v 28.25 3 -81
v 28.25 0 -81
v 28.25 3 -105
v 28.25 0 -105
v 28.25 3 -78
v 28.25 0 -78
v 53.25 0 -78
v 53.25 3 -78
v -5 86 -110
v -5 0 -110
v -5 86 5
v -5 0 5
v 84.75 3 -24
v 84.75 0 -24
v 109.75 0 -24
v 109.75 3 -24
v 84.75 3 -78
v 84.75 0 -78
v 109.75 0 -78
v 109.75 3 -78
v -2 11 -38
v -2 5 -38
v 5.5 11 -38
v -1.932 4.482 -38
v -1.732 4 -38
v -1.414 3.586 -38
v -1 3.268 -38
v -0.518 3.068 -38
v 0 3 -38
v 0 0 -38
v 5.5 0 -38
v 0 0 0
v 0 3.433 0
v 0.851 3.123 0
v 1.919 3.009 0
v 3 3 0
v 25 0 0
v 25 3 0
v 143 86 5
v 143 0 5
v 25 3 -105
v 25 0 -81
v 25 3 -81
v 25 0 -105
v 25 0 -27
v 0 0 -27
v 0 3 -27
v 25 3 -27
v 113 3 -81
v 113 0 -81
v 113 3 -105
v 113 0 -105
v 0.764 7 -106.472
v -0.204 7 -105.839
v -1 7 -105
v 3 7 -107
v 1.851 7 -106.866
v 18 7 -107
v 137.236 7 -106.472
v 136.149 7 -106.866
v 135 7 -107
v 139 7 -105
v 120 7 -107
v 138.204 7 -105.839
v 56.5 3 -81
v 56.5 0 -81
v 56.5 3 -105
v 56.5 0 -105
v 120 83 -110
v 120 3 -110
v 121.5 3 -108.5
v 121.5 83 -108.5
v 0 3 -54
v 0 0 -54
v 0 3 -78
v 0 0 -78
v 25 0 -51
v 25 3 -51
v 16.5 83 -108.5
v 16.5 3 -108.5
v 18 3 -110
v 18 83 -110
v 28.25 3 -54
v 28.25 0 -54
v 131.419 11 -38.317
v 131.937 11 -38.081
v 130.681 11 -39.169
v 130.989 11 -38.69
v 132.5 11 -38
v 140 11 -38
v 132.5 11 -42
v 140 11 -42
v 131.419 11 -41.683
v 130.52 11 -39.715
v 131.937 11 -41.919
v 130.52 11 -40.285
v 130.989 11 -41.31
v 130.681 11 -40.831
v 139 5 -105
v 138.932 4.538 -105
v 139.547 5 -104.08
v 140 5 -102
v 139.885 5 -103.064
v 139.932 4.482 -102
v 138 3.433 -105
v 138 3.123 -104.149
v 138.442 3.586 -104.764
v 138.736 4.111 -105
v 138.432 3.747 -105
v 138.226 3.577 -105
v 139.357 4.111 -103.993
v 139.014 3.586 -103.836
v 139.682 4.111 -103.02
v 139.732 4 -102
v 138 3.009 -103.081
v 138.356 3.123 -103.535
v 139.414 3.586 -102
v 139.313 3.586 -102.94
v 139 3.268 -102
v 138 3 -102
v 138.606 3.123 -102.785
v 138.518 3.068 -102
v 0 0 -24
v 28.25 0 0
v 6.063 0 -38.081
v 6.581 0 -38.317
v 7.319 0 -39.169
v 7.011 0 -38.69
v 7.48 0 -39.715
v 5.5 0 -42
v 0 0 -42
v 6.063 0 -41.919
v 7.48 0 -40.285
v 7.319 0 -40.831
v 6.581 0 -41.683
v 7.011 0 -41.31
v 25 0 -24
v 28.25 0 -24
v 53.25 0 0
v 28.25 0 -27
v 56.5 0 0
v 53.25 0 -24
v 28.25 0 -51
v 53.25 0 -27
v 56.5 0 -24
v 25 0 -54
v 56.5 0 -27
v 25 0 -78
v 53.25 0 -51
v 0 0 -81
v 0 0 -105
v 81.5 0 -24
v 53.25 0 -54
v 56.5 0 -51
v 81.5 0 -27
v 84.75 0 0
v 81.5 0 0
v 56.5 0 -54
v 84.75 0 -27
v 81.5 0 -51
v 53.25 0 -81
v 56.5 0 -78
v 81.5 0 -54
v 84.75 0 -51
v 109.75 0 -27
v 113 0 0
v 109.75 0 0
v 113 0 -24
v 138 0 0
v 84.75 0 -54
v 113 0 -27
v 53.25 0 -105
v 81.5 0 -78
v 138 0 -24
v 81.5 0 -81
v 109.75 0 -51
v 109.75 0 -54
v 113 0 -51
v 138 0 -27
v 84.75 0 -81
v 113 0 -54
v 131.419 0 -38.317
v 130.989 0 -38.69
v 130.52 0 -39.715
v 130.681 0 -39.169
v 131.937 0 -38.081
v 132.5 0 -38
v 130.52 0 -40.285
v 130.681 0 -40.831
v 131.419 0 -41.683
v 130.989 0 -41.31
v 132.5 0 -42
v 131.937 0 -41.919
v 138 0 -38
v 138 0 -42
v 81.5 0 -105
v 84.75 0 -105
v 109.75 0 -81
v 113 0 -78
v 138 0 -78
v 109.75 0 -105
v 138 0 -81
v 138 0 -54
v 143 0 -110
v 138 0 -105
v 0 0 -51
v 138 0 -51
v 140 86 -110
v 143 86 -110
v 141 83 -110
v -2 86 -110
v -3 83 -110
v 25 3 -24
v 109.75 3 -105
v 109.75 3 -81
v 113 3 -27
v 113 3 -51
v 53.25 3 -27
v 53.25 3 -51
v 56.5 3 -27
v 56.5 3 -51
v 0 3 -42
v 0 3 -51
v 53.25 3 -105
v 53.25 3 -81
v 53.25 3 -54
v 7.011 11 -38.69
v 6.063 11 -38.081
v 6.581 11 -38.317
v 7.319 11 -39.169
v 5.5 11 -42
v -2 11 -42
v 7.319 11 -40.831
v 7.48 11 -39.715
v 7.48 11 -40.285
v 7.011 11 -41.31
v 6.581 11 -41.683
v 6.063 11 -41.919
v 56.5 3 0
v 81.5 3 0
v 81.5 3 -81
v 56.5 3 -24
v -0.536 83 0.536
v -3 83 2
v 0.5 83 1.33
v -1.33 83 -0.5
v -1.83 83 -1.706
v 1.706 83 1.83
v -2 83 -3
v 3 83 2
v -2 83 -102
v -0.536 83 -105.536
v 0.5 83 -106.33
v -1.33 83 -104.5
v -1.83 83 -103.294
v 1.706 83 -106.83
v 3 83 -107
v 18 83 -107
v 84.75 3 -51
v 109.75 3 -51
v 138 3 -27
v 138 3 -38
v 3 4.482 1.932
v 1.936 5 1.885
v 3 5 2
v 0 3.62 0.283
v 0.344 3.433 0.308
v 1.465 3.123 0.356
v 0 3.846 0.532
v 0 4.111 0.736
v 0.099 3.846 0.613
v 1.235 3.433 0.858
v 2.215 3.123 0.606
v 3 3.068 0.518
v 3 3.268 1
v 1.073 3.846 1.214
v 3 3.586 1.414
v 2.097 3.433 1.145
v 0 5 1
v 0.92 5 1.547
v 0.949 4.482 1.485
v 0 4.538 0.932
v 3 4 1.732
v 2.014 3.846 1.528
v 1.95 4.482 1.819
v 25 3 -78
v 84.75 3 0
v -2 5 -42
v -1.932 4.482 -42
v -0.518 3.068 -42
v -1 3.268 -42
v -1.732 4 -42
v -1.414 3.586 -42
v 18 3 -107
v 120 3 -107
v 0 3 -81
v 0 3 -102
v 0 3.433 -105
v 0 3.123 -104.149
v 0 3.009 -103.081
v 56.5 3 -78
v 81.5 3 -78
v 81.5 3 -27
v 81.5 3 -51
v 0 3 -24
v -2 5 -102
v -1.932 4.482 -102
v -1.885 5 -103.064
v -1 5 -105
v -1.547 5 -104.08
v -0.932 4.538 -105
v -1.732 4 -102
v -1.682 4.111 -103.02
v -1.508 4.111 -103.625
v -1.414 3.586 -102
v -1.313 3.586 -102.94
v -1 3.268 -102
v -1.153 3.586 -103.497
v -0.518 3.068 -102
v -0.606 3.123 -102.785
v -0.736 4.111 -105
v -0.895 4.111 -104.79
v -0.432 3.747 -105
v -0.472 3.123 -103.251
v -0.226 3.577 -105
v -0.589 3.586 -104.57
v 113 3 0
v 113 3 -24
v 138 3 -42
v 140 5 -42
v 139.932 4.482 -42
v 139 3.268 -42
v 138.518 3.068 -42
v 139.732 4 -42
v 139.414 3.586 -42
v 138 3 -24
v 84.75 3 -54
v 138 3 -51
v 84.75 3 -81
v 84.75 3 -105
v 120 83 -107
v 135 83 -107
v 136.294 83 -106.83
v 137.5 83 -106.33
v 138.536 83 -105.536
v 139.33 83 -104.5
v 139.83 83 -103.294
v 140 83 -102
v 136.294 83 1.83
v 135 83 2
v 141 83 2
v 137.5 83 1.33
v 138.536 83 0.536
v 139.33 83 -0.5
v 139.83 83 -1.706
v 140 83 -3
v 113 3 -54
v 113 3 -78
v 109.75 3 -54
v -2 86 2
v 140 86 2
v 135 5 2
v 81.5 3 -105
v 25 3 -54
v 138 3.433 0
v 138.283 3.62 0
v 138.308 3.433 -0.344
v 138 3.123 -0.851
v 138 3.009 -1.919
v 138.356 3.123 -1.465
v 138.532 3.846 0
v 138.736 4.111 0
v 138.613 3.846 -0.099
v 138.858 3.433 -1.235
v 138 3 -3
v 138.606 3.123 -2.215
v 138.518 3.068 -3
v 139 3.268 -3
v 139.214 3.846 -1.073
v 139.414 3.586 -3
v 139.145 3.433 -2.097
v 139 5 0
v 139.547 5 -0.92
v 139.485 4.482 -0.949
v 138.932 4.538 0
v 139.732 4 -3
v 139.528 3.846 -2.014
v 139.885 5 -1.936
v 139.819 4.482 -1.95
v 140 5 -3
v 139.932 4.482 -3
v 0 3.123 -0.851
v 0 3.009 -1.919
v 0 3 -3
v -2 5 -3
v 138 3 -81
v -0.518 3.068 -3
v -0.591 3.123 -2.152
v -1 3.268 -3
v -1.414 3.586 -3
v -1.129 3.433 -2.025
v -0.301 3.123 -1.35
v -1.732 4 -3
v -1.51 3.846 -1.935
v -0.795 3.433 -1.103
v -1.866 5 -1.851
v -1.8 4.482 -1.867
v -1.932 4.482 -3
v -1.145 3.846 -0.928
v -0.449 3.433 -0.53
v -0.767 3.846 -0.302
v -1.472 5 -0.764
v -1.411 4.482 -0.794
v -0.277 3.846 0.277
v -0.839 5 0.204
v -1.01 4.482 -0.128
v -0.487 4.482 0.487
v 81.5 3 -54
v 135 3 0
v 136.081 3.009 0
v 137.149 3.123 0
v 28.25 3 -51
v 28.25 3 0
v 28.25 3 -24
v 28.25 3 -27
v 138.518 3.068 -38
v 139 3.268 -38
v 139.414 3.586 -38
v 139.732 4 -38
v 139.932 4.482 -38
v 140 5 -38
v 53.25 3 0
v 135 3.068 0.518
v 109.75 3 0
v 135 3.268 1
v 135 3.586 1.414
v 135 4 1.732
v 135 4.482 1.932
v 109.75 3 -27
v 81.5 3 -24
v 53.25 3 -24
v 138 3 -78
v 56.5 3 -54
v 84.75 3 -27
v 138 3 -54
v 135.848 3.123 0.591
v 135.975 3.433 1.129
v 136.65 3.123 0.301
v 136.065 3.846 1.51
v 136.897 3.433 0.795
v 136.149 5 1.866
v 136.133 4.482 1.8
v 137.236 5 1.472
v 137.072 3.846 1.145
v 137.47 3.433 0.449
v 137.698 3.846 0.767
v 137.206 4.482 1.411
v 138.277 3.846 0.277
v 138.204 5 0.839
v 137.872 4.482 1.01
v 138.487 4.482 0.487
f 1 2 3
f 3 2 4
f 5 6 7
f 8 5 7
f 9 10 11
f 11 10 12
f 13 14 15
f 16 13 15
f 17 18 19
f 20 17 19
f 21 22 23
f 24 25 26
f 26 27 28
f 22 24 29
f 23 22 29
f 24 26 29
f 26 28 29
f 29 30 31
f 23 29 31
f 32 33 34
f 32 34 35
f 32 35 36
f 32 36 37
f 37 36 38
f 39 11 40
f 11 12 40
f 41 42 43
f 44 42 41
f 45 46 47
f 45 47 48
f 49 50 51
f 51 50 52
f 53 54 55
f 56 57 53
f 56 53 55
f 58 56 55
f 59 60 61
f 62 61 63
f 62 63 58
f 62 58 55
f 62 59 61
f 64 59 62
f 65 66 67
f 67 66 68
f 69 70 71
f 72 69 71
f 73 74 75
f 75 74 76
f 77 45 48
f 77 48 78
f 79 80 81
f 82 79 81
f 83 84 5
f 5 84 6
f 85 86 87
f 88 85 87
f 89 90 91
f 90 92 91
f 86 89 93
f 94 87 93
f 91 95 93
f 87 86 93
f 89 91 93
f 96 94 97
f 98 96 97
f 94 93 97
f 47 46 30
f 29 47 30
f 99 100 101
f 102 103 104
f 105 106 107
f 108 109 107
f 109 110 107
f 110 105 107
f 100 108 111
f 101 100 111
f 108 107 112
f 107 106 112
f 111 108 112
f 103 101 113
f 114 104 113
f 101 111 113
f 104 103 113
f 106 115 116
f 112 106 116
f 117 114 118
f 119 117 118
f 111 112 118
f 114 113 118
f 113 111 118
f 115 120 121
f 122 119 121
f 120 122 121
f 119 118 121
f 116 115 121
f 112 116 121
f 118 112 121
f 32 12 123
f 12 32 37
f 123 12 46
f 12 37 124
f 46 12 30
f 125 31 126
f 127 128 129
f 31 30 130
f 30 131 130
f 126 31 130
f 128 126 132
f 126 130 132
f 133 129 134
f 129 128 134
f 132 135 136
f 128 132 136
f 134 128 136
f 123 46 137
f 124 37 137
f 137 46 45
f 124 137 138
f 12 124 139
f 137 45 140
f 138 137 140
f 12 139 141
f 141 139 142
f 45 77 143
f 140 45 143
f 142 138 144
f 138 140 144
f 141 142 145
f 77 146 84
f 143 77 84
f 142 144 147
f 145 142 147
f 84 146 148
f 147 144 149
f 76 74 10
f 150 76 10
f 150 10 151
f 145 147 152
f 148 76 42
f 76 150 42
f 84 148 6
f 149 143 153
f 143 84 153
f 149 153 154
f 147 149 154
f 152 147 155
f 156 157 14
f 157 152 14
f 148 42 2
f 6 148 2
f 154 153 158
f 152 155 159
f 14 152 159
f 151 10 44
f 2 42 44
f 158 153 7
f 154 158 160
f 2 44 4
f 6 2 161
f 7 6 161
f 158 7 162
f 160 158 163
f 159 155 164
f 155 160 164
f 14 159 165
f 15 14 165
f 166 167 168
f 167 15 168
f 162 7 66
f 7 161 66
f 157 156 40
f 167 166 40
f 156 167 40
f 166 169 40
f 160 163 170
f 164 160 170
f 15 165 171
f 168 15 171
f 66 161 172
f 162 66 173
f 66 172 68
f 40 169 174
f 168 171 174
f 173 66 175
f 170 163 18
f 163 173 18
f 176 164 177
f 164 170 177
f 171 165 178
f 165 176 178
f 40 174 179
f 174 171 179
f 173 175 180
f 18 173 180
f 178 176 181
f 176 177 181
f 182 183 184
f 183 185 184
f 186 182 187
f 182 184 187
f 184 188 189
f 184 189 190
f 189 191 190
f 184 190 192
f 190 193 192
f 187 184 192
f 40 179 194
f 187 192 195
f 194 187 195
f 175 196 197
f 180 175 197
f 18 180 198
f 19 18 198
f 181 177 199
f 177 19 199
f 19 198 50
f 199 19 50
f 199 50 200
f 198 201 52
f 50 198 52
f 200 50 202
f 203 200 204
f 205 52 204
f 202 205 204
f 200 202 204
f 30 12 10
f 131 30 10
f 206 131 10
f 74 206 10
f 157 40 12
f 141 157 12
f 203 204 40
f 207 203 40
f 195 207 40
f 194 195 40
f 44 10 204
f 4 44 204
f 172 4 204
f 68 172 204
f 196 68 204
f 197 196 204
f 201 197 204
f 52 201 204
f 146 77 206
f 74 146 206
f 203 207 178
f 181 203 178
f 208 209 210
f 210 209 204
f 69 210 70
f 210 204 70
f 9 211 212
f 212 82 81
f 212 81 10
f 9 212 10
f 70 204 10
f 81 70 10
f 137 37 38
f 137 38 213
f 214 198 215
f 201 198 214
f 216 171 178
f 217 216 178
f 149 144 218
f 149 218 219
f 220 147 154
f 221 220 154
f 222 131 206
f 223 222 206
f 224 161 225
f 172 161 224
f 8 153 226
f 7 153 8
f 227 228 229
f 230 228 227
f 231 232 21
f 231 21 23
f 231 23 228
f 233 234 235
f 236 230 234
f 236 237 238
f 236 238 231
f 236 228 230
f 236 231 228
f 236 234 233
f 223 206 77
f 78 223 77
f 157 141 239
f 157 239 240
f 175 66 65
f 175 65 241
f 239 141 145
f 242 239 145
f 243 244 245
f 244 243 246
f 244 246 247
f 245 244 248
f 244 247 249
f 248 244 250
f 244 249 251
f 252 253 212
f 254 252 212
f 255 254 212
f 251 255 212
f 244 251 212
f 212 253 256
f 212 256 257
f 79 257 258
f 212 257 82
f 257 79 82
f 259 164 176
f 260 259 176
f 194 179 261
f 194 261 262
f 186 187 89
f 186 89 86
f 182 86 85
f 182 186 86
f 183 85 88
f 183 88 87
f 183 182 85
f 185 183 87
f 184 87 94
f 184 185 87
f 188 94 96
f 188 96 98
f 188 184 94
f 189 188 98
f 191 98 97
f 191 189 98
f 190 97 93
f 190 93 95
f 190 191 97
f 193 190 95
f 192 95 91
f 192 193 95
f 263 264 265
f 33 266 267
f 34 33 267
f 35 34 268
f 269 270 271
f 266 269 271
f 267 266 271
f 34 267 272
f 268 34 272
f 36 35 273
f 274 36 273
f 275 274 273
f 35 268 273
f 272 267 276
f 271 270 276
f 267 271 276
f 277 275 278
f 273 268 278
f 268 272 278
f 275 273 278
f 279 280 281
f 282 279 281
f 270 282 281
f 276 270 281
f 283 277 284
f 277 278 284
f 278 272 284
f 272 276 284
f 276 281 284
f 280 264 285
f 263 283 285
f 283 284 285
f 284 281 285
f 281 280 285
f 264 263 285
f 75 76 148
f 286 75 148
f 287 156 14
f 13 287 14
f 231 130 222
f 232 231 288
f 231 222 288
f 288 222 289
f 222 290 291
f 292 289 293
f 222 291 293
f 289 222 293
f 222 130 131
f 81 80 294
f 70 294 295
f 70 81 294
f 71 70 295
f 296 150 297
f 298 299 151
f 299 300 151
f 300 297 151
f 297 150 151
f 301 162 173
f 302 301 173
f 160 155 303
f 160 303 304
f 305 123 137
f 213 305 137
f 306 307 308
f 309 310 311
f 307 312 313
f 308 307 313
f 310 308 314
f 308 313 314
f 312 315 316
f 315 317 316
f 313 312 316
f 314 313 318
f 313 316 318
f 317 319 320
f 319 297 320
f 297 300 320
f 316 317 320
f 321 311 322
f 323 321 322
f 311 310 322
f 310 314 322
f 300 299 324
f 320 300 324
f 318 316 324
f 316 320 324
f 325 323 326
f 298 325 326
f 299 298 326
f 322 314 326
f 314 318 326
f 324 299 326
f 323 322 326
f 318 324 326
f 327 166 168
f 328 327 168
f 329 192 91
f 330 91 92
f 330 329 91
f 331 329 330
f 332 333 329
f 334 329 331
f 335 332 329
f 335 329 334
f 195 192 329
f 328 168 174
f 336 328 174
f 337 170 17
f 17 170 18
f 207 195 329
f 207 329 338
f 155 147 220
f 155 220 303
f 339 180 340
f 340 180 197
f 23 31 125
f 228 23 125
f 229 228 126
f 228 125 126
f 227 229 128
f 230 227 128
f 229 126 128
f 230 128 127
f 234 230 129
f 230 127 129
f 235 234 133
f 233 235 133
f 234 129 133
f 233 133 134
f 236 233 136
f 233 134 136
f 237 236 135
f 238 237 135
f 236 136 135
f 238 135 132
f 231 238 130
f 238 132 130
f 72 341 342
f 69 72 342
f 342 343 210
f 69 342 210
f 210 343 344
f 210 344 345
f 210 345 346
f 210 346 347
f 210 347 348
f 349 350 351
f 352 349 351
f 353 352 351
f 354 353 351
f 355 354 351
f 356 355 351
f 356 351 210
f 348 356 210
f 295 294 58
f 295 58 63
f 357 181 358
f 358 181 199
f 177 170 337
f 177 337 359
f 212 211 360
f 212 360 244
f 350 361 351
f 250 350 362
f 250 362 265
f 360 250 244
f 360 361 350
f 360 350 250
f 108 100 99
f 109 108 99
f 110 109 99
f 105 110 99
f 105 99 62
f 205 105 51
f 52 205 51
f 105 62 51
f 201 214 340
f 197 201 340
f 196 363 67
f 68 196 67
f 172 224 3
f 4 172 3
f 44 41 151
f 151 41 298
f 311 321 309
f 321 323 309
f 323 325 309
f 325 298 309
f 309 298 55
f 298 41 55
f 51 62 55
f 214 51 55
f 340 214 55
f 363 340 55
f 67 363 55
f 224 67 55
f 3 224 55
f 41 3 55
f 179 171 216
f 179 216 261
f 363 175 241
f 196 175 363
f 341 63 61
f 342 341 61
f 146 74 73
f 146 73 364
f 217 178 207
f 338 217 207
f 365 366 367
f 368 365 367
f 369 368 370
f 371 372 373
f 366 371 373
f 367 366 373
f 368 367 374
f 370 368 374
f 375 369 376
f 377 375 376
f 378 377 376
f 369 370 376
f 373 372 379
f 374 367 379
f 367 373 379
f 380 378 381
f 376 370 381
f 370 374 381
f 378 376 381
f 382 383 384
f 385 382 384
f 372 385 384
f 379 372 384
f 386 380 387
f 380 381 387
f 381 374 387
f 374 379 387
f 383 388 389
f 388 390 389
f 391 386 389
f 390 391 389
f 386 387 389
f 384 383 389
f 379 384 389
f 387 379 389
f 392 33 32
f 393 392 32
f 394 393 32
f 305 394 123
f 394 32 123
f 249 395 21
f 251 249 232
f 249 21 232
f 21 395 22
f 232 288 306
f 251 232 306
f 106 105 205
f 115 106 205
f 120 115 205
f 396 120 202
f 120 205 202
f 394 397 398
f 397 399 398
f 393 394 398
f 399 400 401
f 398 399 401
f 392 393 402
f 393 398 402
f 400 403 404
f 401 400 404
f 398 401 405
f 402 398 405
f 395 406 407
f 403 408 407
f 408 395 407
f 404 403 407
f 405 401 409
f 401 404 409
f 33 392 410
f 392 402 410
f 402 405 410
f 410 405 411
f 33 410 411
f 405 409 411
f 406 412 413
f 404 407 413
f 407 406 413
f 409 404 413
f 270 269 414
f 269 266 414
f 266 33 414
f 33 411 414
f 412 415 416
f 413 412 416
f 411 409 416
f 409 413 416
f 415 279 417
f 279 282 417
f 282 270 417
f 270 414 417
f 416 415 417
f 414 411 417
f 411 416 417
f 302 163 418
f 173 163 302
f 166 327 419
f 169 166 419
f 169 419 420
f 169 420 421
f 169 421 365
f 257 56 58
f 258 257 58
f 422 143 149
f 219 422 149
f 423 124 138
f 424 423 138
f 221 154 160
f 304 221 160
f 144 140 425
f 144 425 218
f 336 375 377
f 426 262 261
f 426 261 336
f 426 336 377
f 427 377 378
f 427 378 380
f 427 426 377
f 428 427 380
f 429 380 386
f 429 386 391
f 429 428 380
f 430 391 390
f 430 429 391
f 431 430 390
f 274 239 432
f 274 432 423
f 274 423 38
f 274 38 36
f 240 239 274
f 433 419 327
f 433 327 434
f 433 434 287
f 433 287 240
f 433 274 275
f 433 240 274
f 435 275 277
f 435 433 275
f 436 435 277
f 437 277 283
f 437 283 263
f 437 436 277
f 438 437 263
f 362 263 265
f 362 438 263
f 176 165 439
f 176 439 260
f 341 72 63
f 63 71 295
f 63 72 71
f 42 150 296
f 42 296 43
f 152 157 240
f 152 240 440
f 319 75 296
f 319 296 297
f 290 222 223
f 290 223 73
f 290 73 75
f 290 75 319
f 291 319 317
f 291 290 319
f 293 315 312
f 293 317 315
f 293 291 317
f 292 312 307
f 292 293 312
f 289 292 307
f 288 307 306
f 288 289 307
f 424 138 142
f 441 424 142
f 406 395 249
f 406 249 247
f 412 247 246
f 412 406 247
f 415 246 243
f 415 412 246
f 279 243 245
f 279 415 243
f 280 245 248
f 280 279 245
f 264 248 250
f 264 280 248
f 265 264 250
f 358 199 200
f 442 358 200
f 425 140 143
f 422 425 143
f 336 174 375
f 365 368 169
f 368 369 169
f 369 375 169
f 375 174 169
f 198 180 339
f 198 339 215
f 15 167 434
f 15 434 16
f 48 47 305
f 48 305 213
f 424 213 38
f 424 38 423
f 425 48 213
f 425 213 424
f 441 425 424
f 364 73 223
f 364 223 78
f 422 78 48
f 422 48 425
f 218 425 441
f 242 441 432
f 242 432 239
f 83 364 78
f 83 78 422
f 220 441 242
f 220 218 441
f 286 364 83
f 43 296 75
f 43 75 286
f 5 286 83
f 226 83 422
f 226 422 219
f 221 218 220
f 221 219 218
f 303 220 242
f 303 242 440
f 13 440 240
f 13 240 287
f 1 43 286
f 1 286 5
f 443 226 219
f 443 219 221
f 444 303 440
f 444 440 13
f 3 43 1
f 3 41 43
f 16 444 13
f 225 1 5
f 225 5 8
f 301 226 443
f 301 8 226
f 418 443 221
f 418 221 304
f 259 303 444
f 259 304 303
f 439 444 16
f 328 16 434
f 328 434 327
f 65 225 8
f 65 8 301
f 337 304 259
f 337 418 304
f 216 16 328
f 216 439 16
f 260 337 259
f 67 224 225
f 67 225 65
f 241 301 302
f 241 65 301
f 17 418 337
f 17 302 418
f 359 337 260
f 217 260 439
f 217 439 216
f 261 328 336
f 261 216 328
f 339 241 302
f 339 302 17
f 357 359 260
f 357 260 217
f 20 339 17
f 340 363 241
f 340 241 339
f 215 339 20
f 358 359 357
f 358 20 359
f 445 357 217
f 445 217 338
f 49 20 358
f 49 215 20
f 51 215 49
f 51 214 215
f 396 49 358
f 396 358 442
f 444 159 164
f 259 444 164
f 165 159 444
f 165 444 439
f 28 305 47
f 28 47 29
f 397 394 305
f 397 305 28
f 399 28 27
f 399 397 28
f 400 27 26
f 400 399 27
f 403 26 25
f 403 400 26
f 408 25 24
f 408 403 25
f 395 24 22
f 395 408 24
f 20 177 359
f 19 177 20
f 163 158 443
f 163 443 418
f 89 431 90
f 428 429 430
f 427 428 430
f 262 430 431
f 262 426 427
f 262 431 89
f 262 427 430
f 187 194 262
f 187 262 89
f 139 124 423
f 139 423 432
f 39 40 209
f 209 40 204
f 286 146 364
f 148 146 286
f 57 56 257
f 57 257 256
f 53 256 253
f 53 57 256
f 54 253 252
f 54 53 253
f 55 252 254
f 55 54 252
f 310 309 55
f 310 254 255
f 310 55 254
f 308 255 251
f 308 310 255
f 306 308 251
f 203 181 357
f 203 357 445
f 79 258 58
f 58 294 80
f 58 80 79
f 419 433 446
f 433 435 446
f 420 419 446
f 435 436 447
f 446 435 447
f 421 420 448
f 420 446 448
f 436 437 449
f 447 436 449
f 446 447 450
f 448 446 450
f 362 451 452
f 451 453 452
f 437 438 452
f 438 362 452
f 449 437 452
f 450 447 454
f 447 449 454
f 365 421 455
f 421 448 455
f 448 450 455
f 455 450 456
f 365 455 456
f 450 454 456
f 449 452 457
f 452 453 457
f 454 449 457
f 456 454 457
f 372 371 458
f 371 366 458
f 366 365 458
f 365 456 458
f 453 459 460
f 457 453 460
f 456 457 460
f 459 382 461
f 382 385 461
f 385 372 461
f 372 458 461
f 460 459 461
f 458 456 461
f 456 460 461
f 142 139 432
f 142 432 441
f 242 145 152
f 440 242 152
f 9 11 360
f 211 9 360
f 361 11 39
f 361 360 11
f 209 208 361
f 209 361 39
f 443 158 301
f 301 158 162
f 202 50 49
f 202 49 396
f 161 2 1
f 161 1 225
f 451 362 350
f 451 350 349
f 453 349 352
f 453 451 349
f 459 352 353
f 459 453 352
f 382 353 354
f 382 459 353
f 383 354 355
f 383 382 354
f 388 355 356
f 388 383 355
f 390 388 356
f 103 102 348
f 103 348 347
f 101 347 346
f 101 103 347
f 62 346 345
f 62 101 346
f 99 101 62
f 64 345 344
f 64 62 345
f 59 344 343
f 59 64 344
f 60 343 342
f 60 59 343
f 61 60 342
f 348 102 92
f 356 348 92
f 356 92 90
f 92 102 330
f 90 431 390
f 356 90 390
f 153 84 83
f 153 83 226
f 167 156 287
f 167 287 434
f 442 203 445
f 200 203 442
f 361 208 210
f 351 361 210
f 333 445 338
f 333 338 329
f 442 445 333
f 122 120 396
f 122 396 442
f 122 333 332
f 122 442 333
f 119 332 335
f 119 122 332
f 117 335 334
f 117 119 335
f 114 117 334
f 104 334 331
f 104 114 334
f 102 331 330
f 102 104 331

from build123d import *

# Parameters (mm, degrees)
SKETCH1_W                = 148
SKETCH1_H                = 115
SKETCH1_W_2              = 25
SKETCH1_H_2              = 24
BOSS_EXTRUDE2_DEPTH      = 3
BOSS_EXTRUDE3_DEPTH      = 80
SKETCH21_W               = 142
SKETCH21_H               = 2
BOSS_EXTRUDE9_DEPTH      = 4
BOSS_EXTRUDE7_DEPTH      = 8
BOSS_EXTRUDE7_DEPTH_BACK = 3
BOSS_EXTRUDE8_DEPTH      = 3
CUT_EXTRUDE1_DEPTH       = 112
FILLET1_R                = 5
FILLET2_R                = 2


with BuildPart() as part:
    # Sketch1 → Boss-Extrude2 (new body)
    with BuildSketch(Plane(origin=(0, 0, 0), x_dir=(1, 0, 0), z_dir=(0, 1, 0))):
        with Locations((69, 52.5)):
            Rectangle(SKETCH1_W, SKETCH1_H)
        with Locations((12.5, 66)):
            Rectangle(SKETCH1_W_2, SKETCH1_H_2, mode=Mode.SUBTRACT)
        with Locations((12.5, 39)):
            Rectangle(SKETCH1_W_2, SKETCH1_H_2, mode=Mode.SUBTRACT)
        with Locations((40.75, 66)):
            Rectangle(SKETCH1_W_2, SKETCH1_H_2, mode=Mode.SUBTRACT)
        with Locations((40.75, 39)):
            Rectangle(SKETCH1_W_2, SKETCH1_H_2, mode=Mode.SUBTRACT)
        with Locations((12.5, 12)):
            Rectangle(SKETCH1_W_2, SKETCH1_H_2, mode=Mode.SUBTRACT)
        with Locations((12.5, 93)):
            Rectangle(SKETCH1_W_2, SKETCH1_H_2, mode=Mode.SUBTRACT)
        with Locations((40.75, 12)):
            Rectangle(SKETCH1_W_2, SKETCH1_H_2, mode=Mode.SUBTRACT)
        with Locations((40.75, 93)):
            Rectangle(SKETCH1_W_2, SKETCH1_H_2, mode=Mode.SUBTRACT)
        with Locations((69, 66)):
            Rectangle(SKETCH1_W_2, SKETCH1_H_2, mode=Mode.SUBTRACT)
        with Locations((69, 39)):
            Rectangle(SKETCH1_W_2, SKETCH1_H_2, mode=Mode.SUBTRACT)
        with Locations((69, 12)):
            Rectangle(SKETCH1_W_2, SKETCH1_H_2, mode=Mode.SUBTRACT)
        with Locations((69, 93)):
            Rectangle(SKETCH1_W_2, SKETCH1_H_2, mode=Mode.SUBTRACT)
        with Locations((97.25, 66)):
            Rectangle(SKETCH1_W_2, SKETCH1_H_2, mode=Mode.SUBTRACT)
        with Locations((97.25, 39)):
            Rectangle(SKETCH1_W_2, SKETCH1_H_2, mode=Mode.SUBTRACT)
        with Locations((97.25, 12)):
            Rectangle(SKETCH1_W_2, SKETCH1_H_2, mode=Mode.SUBTRACT)
        with Locations((97.25, 93)):
            Rectangle(SKETCH1_W_2, SKETCH1_H_2, mode=Mode.SUBTRACT)
        with Locations((125.5, 66)):
            Rectangle(SKETCH1_W_2, SKETCH1_H_2, mode=Mode.SUBTRACT)
        with Locations((125.5, 39)):
            Rectangle(SKETCH1_W_2, SKETCH1_H_2, mode=Mode.SUBTRACT)
        with Locations((125.5, 12)):
            Rectangle(SKETCH1_W_2, SKETCH1_H_2, mode=Mode.SUBTRACT)
        with Locations((125.5, 93)):
            Rectangle(SKETCH1_W_2, SKETCH1_H_2, mode=Mode.SUBTRACT)
    extrude(amount=BOSS_EXTRUDE2_DEPTH)

    # Sketch4 → Boss-Extrude3 (add)
    with BuildSketch(Plane(origin=(0, 3, 0), x_dir=(1, 0, 0), z_dir=(0, 1, 0))):
        Polygon((-5, -5), (143, -5), (143, 110), (120, 110), (121.5, 108.5), (120, 107), (140, 107), (140, -2), (-2, -2), (-2, 107), (18, 107), (16.5, 108.5), (18, 110), (-5, 110), align=None)
    extrude(amount=BOSS_EXTRUDE3_DEPTH)

    # Sketch21 → Boss-Extrude9 (add)
    with BuildSketch(Plane(origin=(0, 3, 0), x_dir=(1, 0, 0), z_dir=(0, 1, 0))):
        with Locations((69, 106)):
            Rectangle(SKETCH21_W, SKETCH21_H)
    extrude(amount=BOSS_EXTRUDE9_DEPTH)

    # Sketch16 → Boss-Extrude7 (add, two sides: drawn at the far end of the back side and taken through both)
    with BuildSketch(Plane(origin=(0, 3, 0), x_dir=(1, 0, 0), z_dir=(0, 1, 0)).offset(-BOSS_EXTRUDE7_DEPTH_BACK)):
        with BuildLine():
            Line((5.5, 42), (-2, 42))
            Line((-2, 42), (-2, 38))
            Line((-2, 38), (5.5, 38))
            ThreePointArc((5.5, 38), (7.5, 40), (5.5, 42))
        make_face()
        with BuildLine():
            Line((140, 38), (132.5, 38))
            ThreePointArc((132.5, 38), (130.5, 40), (132.5, 42))
            Line((132.5, 42), (140, 42))
            Line((140, 42), (140, 38))
        make_face()
    extrude(amount=BOSS_EXTRUDE7_DEPTH + BOSS_EXTRUDE7_DEPTH_BACK)

    # Sketch17 → Boss-Extrude8 (add)
    with BuildSketch(Plane(origin=(0, 83, 0), x_dir=(1, 0, 0), z_dir=(0, 1, 0))):
        Polygon((-2, 110), (-5, 110), (-5, -5), (143, -5), (143, 110), (140, 110), (140, -2), (-2, -2), align=None)
    extrude(amount=BOSS_EXTRUDE8_DEPTH)

    # Sketch18 → Cut-Extrude1 (cut)
    with BuildSketch(Plane(origin=(0, 0, -110), x_dir=(-1, 0, 0), z_dir=(0, 0, -1))):
        Polygon((2, 86), (3, 83), (2, 83), align=None)
        Polygon((-140, 83), (-140, 86), (-141, 83), align=None)
    extrude(amount=-CUT_EXTRUDE1_DEPTH, mode=Mode.SUBTRACT)

    # Fillet1
    # the kernel refuses this fillet: 5 mm, written as the material it adds along each edge
    with BuildSketch(Plane(origin=(140, -5.5, -107), x_dir=(-1, 0, 0), z_dir=(0, 1, 0))) as fillet1_piece_1_section:
        with BuildLine():
            CenterArc((FILLET1_R, FILLET1_R), FILLET1_R, 180, 90)
            Line((0, FILLET1_R), (0, 0))
            Line((0, 0), (FILLET1_R, 0))
        make_face()
    fillet1_piece_1 = extrude(amount=88.5, mode=Mode.PRIVATE)
    fillet1_piece_1 = split(fillet1_piece_1, bisect_by=Plane(origin=(139.705950561, 3, -104.265828048), z_dir=(0, 1, 0)), keep=Keep.TOP, mode=Mode.PRIVATE)
    add(fillet1_piece_1)
    with BuildSketch(Plane(origin=(-2, -5.5, -107), x_dir=(0, 0, 1), z_dir=(0, 1, 0))) as fillet1_piece_2_section:
        with BuildLine():
            CenterArc((FILLET1_R, FILLET1_R), FILLET1_R, 180, 90)
            Line((0, FILLET1_R), (0, 0))
            Line((0, 0), (FILLET1_R, 0))
        make_face()
    fillet1_piece_2 = extrude(amount=88.5, mode=Mode.PRIVATE)
    fillet1_piece_2 = split(fillet1_piece_2, bisect_by=Plane(origin=(-1.705950561, 3, -104.265828048), z_dir=(0, 1, 0)), keep=Keep.TOP, mode=Mode.PRIVATE)
    add(fillet1_piece_2)
    with BuildSketch(Plane(origin=(140, 3, 2), x_dir=(-1, 0, 0), z_dir=(0, 1, 0)), Plane(origin=(-2, 3, 2), x_dir=(0, 0, -1), z_dir=(0, 1, 0))) as fillet1_piece_3:
        with BuildLine():
            CenterArc((FILLET1_R, -FILLET1_R), FILLET1_R, 90, 90)
            Line((0, -FILLET1_R), (0, 0))
            Line((0, 0), (FILLET1_R, 0))
        make_face()
    extrude(amount=80)

    # Fillet2
    # the kernel refuses this fillet: 2 mm, written as the material it adds along each edge
    with BuildSketch(Plane(origin=(135, 3, -102), x_dir=(-0.07270796920191176, 0, -0.9973532730254281), z_dir=(-0.9973532730254281, 0, 0.07270796920191176))) as fillet2_piece_1_section:
        with BuildLine():
            CenterArc((5 - FILLET2_R, -FILLET2_R), FILLET2_R, 0, 90)
            Line((5 - FILLET2_R, 0), (5, 0))
            Line((5, 0), (5, -FILLET2_R))
        make_face()
    fillet2_piece_1 = revolve(axis=Axis((135, 3, -102), (0, -1, 0)), revolution_arc=94.169538965, mode=Mode.PRIVATE)
    fillet2_piece_1 = split(fillet2_piece_1, bisect_by=Plane(origin=(138, 3.470530123, -106.266382325), z_dir=(-1, 0, 0)), keep=Keep.TOP, mode=Mode.PRIVATE)
    fillet2_piece_1 = split(fillet2_piece_1, bisect_by=Plane(origin=(136.35715758, 3.470530123, -105), z_dir=(0, 0, -1)), keep=Keep.TOP, mode=Mode.PRIVATE)
    add(fillet2_piece_1)
    with BuildSketch(Plane(origin=(135, 3, -102), x_dir=(-0.07270796920191176, 0, -0.9973532730254281), z_dir=(-0.9973532730254281, 0, 0.07270796920191176))) as fillet2_piece_2_section:
        with BuildLine():
            CenterArc((5 - FILLET2_R, -FILLET2_R), FILLET2_R, 0, 90)
            Line((5 - FILLET2_R, 0), (5, 0))
            Line((5, 0), (5, -FILLET2_R))
        make_face()
    fillet2_piece_2 = revolve(axis=Axis((135, 3, -102), (0, -1, 0)), revolution_arc=94.169538965, mode=Mode.PRIVATE)
    fillet2_piece_2 = split(fillet2_piece_2, bisect_by=Plane(origin=(138, 3.649157182, -105.409619708), z_dir=(1, 0, 0)), keep=Keep.TOP, mode=Mode.PRIVATE)
    fillet2_piece_2 = split(fillet2_piece_2, bisect_by=Plane(origin=(138.409619683, 3.649157182, -105), z_dir=(0, 0, -1)), keep=Keep.TOP, mode=Mode.PRIVATE)
    add(fillet2_piece_2)
    with BuildSketch(Plane(origin=(135, 3, -102), x_dir=(-0.07270796920191176, 0, -0.9973532730254281), z_dir=(-0.9973532730254281, 0, 0.07270796920191176))) as fillet2_piece_3_section:
        with BuildLine():
            CenterArc((5 - FILLET2_R, -FILLET2_R), FILLET2_R, 0, 90)
            Line((5 - FILLET2_R, 0), (5, 0))
            Line((5, 0), (5, -FILLET2_R))
        make_face()
    fillet2_piece_3 = revolve(axis=Axis((135, 3, -102), (0, -1, 0)), revolution_arc=94.169538965, mode=Mode.PRIVATE)
    fillet2_piece_3 = split(fillet2_piece_3, bisect_by=Plane(origin=(138, 3.469844762, -103.519186596), z_dir=(1, 0, 0)), keep=Keep.TOP, mode=Mode.PRIVATE)
    fillet2_piece_3 = split(fillet2_piece_3, bisect_by=Plane(origin=(139.232598195, 3.469844762, -105), z_dir=(0, 0, 1)), keep=Keep.TOP, mode=Mode.PRIVATE)
    add(fillet2_piece_3)
    with BuildSketch(Plane(origin=(135, 3, -3), x_dir=(0, 0, 1), z_dir=(-1, 0, 0))) as fillet2_piece_4_section:
        with BuildLine():
            CenterArc((5 - FILLET2_R, FILLET2_R), FILLET2_R, 270, 90)
            Line((5 - FILLET2_R, 0), (5, 0))
            Line((5, 0), (5, FILLET2_R))
        make_face()
    fillet2_piece_4 = revolve(axis=Axis((135, 3, -3), (0, 1, 0)), revolution_arc=90, mode=Mode.PRIVATE)
    fillet2_piece_4 = split(fillet2_piece_4, bisect_by=Plane(origin=(136.519186645, 3.469844745, 0), z_dir=(0, 0, 1)), keep=Keep.TOP, mode=Mode.PRIVATE)
    fillet2_piece_4 = split(fillet2_piece_4, bisect_by=Plane(origin=(138, 3.469844745, 1.232598019), z_dir=(-1, 0, 0)), keep=Keep.TOP, mode=Mode.PRIVATE)
    add(fillet2_piece_4)
    with BuildSketch(Plane(origin=(135, 3, -3), x_dir=(0, 0, 1), z_dir=(-1, 0, 0))) as fillet2_piece_5_section:
        with BuildLine():
            CenterArc((5 - FILLET2_R, FILLET2_R), FILLET2_R, 270, 90)
            Line((5 - FILLET2_R, 0), (5, 0))
            Line((5, 0), (5, FILLET2_R))
        make_face()
    fillet2_piece_5 = revolve(axis=Axis((135, 3, -3), (0, 1, 0)), revolution_arc=90, mode=Mode.PRIVATE)
    fillet2_piece_5 = split(fillet2_piece_5, bisect_by=Plane(origin=(138.409619683, 3.649157182, 0), z_dir=(0, 0, 1)), keep=Keep.TOP, mode=Mode.PRIVATE)
    fillet2_piece_5 = split(fillet2_piece_5, bisect_by=Plane(origin=(138, 3.649157182, 0.409619708), z_dir=(1, 0, 0)), keep=Keep.TOP, mode=Mode.PRIVATE)
    add(fillet2_piece_5)
    with BuildSketch(Plane(origin=(135, 3, -3), x_dir=(0, 0, 1), z_dir=(-1, 0, 0))) as fillet2_piece_6_section:
        with BuildLine():
            CenterArc((5 - FILLET2_R, FILLET2_R), FILLET2_R, 270, 90)
            Line((5 - FILLET2_R, 0), (5, 0))
            Line((5, 0), (5, FILLET2_R))
        make_face()
    fillet2_piece_6 = revolve(axis=Axis((135, 3, -3), (0, 1, 0)), revolution_arc=90, mode=Mode.PRIVATE)
    fillet2_piece_6 = split(fillet2_piece_6, bisect_by=Plane(origin=(139.232598178, 3.469844758, 0), z_dir=(0, 0, -1)), keep=Keep.TOP, mode=Mode.PRIVATE)
    fillet2_piece_6 = split(fillet2_piece_6, bisect_by=Plane(origin=(138, 3.469844758, -1.480813405), z_dir=(1, 0, 0)), keep=Keep.TOP, mode=Mode.PRIVATE)
    add(fillet2_piece_6)
    with BuildSketch(Plane(origin=(3, 3, -3), x_dir=(-1, 0, 0), z_dir=(0, 0, -1))) as fillet2_piece_7_section:
        with BuildLine():
            CenterArc((5 - FILLET2_R, FILLET2_R), FILLET2_R, 270, 90)
            Line((5 - FILLET2_R, 0), (5, 0))
            Line((5, 0), (5, FILLET2_R))
        make_face()
    fillet2_piece_7 = revolve(axis=Axis((3, 3, -3), (0, 1, 0)), revolution_arc=90, mode=Mode.PRIVATE)
    fillet2_piece_7 = split(fillet2_piece_7, bisect_by=Plane(origin=(0, 3.469844745, -1.480813355), z_dir=(-1, 0, 0)), keep=Keep.TOP, mode=Mode.PRIVATE)
    fillet2_piece_7 = split(fillet2_piece_7, bisect_by=Plane(origin=(-1.232598019, 3.469844745, 0), z_dir=(0, 0, -1)), keep=Keep.TOP, mode=Mode.PRIVATE)
    add(fillet2_piece_7)
    with BuildSketch(Plane(origin=(3, 3, -3), x_dir=(-1, 0, 0), z_dir=(0, 0, -1))) as fillet2_piece_8_section:
        with BuildLine():
            CenterArc((5 - FILLET2_R, FILLET2_R), FILLET2_R, 270, 90)
            Line((5 - FILLET2_R, 0), (5, 0))
            Line((5, 0), (5, FILLET2_R))
        make_face()
    fillet2_piece_8 = revolve(axis=Axis((3, 3, -3), (0, 1, 0)), revolution_arc=90, mode=Mode.PRIVATE)
    fillet2_piece_8 = split(fillet2_piece_8, bisect_by=Plane(origin=(0, 3.649157182, 0.409619683), z_dir=(-1, 0, 0)), keep=Keep.TOP, mode=Mode.PRIVATE)
    fillet2_piece_8 = split(fillet2_piece_8, bisect_by=Plane(origin=(-0.409619708, 3.649157182, 0), z_dir=(0, 0, 1)), keep=Keep.TOP, mode=Mode.PRIVATE)
    add(fillet2_piece_8)
    with BuildSketch(Plane(origin=(3, 3, -3), x_dir=(-1, 0, 0), z_dir=(0, 0, -1))) as fillet2_piece_9_section:
        with BuildLine():
            CenterArc((5 - FILLET2_R, FILLET2_R), FILLET2_R, 270, 90)
            Line((5 - FILLET2_R, 0), (5, 0))
            Line((5, 0), (5, FILLET2_R))
        make_face()
    fillet2_piece_9 = revolve(axis=Axis((3, 3, -3), (0, 1, 0)), revolution_arc=90, mode=Mode.PRIVATE)
    fillet2_piece_9 = split(fillet2_piece_9, bisect_by=Plane(origin=(0, 3.469844758, 1.232598178), z_dir=(1, 0, 0)), keep=Keep.TOP, mode=Mode.PRIVATE)
    fillet2_piece_9 = split(fillet2_piece_9, bisect_by=Plane(origin=(1.480813405, 3.469844758, 0), z_dir=(0, 0, 1)), keep=Keep.TOP, mode=Mode.PRIVATE)
    add(fillet2_piece_9)
    with BuildSketch(Plane(origin=(3, 3, -102), x_dir=(-1, 0, 0), z_dir=(0, 0, 1))) as fillet2_piece_10_section:
        with BuildLine():
            CenterArc((5 - FILLET2_R, -FILLET2_R), FILLET2_R, 0, 90)
            Line((5 - FILLET2_R, 0), (5, 0))
            Line((5, 0), (5, -FILLET2_R))
        make_face()
    fillet2_piece_10 = revolve(axis=Axis((3, 3, -102), (0, -1, 0)), revolution_arc=94.169538965, mode=Mode.PRIVATE)
    fillet2_piece_10 = split(fillet2_piece_10, bisect_by=Plane(origin=(0, 3.469844744, -103.519186642), z_dir=(-1, 0, 0)), keep=Keep.TOP, mode=Mode.PRIVATE)
    fillet2_piece_10 = split(fillet2_piece_10, bisect_by=Plane(origin=(-1.232598016, 3.469844744, -105), z_dir=(0, 0, 1)), keep=Keep.TOP, mode=Mode.PRIVATE)
    add(fillet2_piece_10)
    with BuildSketch(Plane(origin=(3, 3, -102), x_dir=(-1, 0, 0), z_dir=(0, 0, 1))) as fillet2_piece_11_section:
        with BuildLine():
            CenterArc((5 - FILLET2_R, -FILLET2_R), FILLET2_R, 0, 90)
            Line((5 - FILLET2_R, 0), (5, 0))
            Line((5, 0), (5, -FILLET2_R))
        make_face()
    fillet2_piece_11 = revolve(axis=Axis((3, 3, -102), (0, -1, 0)), revolution_arc=94.169538965, mode=Mode.PRIVATE)
    fillet2_piece_11 = split(fillet2_piece_11, bisect_by=Plane(origin=(0, 3.649157182, -105.409619683), z_dir=(-1, 0, 0)), keep=Keep.TOP, mode=Mode.PRIVATE)
    fillet2_piece_11 = split(fillet2_piece_11, bisect_by=Plane(origin=(-0.409619708, 3.649157182, -105), z_dir=(0, 0, -1)), keep=Keep.TOP, mode=Mode.PRIVATE)
    add(fillet2_piece_11)
    with BuildSketch(Plane(origin=(3, 3, -102), x_dir=(-1, 0, 0), z_dir=(0, 0, 1))) as fillet2_piece_12_section:
        with BuildLine():
            CenterArc((5 - FILLET2_R, -FILLET2_R), FILLET2_R, 0, 90)
            Line((5 - FILLET2_R, 0), (5, 0))
            Line((5, 0), (5, -FILLET2_R))
        make_face()
    fillet2_piece_12 = revolve(axis=Axis((3, 3, -102), (0, -1, 0)), revolution_arc=94.169538965, mode=Mode.PRIVATE)
    fillet2_piece_12 = split(fillet2_piece_12, bisect_by=Plane(origin=(0, 3.470530119, -106.266382366), z_dir=(1, 0, 0)), keep=Keep.TOP, mode=Mode.PRIVATE)
    fillet2_piece_12 = split(fillet2_piece_12, bisect_by=Plane(origin=(1.642842463, 3.470530119, -105), z_dir=(0, 0, -1)), keep=Keep.TOP, mode=Mode.PRIVATE)
    add(fillet2_piece_12)
    with BuildSketch(Plane(origin=(140, 3, -102), x_dir=(-1, 0, 0), z_dir=(0, 0, 1))) as fillet2_piece_13:
        with BuildLine():
            CenterArc((FILLET2_R, -FILLET2_R), FILLET2_R, 90, 90)
            Line((0, -FILLET2_R), (0, 0))
            Line((0, 0), (FILLET2_R, 0))
        make_face()
    extrude(amount=65)
    with BuildSketch(Plane(origin=(140, 3, -43), x_dir=(-1, 0, 0), z_dir=(0, 0, 1))) as fillet2_piece_14:
        with BuildLine():
            CenterArc((FILLET2_R, -FILLET2_R), FILLET2_R, 90, 90)
            Line((0, -FILLET2_R), (0, 0))
            Line((0, 0), (FILLET2_R, 0))
        make_face()
    extrude(amount=40)
    with BuildSketch(Plane(origin=(135, 3, 2), x_dir=(0, 0, -1), z_dir=(-1, 0, 0))) as fillet2_piece_15:
        with BuildLine():
            CenterArc((FILLET2_R, -FILLET2_R), FILLET2_R, 90, 90)
            Line((0, -FILLET2_R), (0, 0))
            Line((0, 0), (FILLET2_R, 0))
        make_face()
    extrude(amount=132)
    with BuildSketch(Plane(origin=(-2, 3, -3), x_dir=(0, 1, 0), z_dir=(0, 0, -1))) as fillet2_piece_16:
        with BuildLine():
            CenterArc((FILLET2_R, FILLET2_R), FILLET2_R, 180, 90)
            Line((0, FILLET2_R), (0, 0))
            Line((0, 0), (FILLET2_R, 0))
        make_face()
    extrude(amount=40)
    with BuildSketch(Plane(origin=(-2, 3, -37), x_dir=(0, 1, 0), z_dir=(0, 0, -1))) as fillet2_piece_17:
        with BuildLine():
            CenterArc((FILLET2_R, FILLET2_R), FILLET2_R, 180, 90)
            Line((0, FILLET2_R), (0, 0))
            Line((0, 0), (FILLET2_R, 0))
        make_face()
    extrude(amount=65)


solid = part.part
